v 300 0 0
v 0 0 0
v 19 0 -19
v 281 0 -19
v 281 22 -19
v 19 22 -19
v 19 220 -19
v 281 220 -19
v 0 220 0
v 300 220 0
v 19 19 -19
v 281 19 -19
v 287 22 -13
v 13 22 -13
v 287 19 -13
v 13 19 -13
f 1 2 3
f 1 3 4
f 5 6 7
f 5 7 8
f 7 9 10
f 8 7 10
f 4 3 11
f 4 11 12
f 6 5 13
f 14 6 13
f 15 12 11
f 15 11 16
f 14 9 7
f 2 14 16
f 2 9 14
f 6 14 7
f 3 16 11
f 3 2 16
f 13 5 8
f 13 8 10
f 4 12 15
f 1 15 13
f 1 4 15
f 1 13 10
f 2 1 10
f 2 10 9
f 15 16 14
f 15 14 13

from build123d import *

# Parameters (mm, degrees)
F1_DEPTH = 220
F2_W     = 358.275851
F2_H     = 3
F3_DEPTH = 6


with BuildPart() as f1:
    # F0 (on Front) → F1 (new body)
    with BuildSketch(Plane.XZ):
        Polygon((300, 0), (0, 0), (19, -19), (281, -19), align=None)
    extrude(amount=-F1_DEPTH)

    # F2 (on face) → F3 (cut)
    with BuildSketch(Plane(origin=(0, 0, -19), x_dir=(1, 0, 0), z_dir=(0, 0, -1))):
        with Locations((172.087271, -20.5)):
            Rectangle(F2_W, F2_H)
    extrude(amount=-F3_DEPTH, mode=Mode.SUBTRACT)


solid = f1.part
